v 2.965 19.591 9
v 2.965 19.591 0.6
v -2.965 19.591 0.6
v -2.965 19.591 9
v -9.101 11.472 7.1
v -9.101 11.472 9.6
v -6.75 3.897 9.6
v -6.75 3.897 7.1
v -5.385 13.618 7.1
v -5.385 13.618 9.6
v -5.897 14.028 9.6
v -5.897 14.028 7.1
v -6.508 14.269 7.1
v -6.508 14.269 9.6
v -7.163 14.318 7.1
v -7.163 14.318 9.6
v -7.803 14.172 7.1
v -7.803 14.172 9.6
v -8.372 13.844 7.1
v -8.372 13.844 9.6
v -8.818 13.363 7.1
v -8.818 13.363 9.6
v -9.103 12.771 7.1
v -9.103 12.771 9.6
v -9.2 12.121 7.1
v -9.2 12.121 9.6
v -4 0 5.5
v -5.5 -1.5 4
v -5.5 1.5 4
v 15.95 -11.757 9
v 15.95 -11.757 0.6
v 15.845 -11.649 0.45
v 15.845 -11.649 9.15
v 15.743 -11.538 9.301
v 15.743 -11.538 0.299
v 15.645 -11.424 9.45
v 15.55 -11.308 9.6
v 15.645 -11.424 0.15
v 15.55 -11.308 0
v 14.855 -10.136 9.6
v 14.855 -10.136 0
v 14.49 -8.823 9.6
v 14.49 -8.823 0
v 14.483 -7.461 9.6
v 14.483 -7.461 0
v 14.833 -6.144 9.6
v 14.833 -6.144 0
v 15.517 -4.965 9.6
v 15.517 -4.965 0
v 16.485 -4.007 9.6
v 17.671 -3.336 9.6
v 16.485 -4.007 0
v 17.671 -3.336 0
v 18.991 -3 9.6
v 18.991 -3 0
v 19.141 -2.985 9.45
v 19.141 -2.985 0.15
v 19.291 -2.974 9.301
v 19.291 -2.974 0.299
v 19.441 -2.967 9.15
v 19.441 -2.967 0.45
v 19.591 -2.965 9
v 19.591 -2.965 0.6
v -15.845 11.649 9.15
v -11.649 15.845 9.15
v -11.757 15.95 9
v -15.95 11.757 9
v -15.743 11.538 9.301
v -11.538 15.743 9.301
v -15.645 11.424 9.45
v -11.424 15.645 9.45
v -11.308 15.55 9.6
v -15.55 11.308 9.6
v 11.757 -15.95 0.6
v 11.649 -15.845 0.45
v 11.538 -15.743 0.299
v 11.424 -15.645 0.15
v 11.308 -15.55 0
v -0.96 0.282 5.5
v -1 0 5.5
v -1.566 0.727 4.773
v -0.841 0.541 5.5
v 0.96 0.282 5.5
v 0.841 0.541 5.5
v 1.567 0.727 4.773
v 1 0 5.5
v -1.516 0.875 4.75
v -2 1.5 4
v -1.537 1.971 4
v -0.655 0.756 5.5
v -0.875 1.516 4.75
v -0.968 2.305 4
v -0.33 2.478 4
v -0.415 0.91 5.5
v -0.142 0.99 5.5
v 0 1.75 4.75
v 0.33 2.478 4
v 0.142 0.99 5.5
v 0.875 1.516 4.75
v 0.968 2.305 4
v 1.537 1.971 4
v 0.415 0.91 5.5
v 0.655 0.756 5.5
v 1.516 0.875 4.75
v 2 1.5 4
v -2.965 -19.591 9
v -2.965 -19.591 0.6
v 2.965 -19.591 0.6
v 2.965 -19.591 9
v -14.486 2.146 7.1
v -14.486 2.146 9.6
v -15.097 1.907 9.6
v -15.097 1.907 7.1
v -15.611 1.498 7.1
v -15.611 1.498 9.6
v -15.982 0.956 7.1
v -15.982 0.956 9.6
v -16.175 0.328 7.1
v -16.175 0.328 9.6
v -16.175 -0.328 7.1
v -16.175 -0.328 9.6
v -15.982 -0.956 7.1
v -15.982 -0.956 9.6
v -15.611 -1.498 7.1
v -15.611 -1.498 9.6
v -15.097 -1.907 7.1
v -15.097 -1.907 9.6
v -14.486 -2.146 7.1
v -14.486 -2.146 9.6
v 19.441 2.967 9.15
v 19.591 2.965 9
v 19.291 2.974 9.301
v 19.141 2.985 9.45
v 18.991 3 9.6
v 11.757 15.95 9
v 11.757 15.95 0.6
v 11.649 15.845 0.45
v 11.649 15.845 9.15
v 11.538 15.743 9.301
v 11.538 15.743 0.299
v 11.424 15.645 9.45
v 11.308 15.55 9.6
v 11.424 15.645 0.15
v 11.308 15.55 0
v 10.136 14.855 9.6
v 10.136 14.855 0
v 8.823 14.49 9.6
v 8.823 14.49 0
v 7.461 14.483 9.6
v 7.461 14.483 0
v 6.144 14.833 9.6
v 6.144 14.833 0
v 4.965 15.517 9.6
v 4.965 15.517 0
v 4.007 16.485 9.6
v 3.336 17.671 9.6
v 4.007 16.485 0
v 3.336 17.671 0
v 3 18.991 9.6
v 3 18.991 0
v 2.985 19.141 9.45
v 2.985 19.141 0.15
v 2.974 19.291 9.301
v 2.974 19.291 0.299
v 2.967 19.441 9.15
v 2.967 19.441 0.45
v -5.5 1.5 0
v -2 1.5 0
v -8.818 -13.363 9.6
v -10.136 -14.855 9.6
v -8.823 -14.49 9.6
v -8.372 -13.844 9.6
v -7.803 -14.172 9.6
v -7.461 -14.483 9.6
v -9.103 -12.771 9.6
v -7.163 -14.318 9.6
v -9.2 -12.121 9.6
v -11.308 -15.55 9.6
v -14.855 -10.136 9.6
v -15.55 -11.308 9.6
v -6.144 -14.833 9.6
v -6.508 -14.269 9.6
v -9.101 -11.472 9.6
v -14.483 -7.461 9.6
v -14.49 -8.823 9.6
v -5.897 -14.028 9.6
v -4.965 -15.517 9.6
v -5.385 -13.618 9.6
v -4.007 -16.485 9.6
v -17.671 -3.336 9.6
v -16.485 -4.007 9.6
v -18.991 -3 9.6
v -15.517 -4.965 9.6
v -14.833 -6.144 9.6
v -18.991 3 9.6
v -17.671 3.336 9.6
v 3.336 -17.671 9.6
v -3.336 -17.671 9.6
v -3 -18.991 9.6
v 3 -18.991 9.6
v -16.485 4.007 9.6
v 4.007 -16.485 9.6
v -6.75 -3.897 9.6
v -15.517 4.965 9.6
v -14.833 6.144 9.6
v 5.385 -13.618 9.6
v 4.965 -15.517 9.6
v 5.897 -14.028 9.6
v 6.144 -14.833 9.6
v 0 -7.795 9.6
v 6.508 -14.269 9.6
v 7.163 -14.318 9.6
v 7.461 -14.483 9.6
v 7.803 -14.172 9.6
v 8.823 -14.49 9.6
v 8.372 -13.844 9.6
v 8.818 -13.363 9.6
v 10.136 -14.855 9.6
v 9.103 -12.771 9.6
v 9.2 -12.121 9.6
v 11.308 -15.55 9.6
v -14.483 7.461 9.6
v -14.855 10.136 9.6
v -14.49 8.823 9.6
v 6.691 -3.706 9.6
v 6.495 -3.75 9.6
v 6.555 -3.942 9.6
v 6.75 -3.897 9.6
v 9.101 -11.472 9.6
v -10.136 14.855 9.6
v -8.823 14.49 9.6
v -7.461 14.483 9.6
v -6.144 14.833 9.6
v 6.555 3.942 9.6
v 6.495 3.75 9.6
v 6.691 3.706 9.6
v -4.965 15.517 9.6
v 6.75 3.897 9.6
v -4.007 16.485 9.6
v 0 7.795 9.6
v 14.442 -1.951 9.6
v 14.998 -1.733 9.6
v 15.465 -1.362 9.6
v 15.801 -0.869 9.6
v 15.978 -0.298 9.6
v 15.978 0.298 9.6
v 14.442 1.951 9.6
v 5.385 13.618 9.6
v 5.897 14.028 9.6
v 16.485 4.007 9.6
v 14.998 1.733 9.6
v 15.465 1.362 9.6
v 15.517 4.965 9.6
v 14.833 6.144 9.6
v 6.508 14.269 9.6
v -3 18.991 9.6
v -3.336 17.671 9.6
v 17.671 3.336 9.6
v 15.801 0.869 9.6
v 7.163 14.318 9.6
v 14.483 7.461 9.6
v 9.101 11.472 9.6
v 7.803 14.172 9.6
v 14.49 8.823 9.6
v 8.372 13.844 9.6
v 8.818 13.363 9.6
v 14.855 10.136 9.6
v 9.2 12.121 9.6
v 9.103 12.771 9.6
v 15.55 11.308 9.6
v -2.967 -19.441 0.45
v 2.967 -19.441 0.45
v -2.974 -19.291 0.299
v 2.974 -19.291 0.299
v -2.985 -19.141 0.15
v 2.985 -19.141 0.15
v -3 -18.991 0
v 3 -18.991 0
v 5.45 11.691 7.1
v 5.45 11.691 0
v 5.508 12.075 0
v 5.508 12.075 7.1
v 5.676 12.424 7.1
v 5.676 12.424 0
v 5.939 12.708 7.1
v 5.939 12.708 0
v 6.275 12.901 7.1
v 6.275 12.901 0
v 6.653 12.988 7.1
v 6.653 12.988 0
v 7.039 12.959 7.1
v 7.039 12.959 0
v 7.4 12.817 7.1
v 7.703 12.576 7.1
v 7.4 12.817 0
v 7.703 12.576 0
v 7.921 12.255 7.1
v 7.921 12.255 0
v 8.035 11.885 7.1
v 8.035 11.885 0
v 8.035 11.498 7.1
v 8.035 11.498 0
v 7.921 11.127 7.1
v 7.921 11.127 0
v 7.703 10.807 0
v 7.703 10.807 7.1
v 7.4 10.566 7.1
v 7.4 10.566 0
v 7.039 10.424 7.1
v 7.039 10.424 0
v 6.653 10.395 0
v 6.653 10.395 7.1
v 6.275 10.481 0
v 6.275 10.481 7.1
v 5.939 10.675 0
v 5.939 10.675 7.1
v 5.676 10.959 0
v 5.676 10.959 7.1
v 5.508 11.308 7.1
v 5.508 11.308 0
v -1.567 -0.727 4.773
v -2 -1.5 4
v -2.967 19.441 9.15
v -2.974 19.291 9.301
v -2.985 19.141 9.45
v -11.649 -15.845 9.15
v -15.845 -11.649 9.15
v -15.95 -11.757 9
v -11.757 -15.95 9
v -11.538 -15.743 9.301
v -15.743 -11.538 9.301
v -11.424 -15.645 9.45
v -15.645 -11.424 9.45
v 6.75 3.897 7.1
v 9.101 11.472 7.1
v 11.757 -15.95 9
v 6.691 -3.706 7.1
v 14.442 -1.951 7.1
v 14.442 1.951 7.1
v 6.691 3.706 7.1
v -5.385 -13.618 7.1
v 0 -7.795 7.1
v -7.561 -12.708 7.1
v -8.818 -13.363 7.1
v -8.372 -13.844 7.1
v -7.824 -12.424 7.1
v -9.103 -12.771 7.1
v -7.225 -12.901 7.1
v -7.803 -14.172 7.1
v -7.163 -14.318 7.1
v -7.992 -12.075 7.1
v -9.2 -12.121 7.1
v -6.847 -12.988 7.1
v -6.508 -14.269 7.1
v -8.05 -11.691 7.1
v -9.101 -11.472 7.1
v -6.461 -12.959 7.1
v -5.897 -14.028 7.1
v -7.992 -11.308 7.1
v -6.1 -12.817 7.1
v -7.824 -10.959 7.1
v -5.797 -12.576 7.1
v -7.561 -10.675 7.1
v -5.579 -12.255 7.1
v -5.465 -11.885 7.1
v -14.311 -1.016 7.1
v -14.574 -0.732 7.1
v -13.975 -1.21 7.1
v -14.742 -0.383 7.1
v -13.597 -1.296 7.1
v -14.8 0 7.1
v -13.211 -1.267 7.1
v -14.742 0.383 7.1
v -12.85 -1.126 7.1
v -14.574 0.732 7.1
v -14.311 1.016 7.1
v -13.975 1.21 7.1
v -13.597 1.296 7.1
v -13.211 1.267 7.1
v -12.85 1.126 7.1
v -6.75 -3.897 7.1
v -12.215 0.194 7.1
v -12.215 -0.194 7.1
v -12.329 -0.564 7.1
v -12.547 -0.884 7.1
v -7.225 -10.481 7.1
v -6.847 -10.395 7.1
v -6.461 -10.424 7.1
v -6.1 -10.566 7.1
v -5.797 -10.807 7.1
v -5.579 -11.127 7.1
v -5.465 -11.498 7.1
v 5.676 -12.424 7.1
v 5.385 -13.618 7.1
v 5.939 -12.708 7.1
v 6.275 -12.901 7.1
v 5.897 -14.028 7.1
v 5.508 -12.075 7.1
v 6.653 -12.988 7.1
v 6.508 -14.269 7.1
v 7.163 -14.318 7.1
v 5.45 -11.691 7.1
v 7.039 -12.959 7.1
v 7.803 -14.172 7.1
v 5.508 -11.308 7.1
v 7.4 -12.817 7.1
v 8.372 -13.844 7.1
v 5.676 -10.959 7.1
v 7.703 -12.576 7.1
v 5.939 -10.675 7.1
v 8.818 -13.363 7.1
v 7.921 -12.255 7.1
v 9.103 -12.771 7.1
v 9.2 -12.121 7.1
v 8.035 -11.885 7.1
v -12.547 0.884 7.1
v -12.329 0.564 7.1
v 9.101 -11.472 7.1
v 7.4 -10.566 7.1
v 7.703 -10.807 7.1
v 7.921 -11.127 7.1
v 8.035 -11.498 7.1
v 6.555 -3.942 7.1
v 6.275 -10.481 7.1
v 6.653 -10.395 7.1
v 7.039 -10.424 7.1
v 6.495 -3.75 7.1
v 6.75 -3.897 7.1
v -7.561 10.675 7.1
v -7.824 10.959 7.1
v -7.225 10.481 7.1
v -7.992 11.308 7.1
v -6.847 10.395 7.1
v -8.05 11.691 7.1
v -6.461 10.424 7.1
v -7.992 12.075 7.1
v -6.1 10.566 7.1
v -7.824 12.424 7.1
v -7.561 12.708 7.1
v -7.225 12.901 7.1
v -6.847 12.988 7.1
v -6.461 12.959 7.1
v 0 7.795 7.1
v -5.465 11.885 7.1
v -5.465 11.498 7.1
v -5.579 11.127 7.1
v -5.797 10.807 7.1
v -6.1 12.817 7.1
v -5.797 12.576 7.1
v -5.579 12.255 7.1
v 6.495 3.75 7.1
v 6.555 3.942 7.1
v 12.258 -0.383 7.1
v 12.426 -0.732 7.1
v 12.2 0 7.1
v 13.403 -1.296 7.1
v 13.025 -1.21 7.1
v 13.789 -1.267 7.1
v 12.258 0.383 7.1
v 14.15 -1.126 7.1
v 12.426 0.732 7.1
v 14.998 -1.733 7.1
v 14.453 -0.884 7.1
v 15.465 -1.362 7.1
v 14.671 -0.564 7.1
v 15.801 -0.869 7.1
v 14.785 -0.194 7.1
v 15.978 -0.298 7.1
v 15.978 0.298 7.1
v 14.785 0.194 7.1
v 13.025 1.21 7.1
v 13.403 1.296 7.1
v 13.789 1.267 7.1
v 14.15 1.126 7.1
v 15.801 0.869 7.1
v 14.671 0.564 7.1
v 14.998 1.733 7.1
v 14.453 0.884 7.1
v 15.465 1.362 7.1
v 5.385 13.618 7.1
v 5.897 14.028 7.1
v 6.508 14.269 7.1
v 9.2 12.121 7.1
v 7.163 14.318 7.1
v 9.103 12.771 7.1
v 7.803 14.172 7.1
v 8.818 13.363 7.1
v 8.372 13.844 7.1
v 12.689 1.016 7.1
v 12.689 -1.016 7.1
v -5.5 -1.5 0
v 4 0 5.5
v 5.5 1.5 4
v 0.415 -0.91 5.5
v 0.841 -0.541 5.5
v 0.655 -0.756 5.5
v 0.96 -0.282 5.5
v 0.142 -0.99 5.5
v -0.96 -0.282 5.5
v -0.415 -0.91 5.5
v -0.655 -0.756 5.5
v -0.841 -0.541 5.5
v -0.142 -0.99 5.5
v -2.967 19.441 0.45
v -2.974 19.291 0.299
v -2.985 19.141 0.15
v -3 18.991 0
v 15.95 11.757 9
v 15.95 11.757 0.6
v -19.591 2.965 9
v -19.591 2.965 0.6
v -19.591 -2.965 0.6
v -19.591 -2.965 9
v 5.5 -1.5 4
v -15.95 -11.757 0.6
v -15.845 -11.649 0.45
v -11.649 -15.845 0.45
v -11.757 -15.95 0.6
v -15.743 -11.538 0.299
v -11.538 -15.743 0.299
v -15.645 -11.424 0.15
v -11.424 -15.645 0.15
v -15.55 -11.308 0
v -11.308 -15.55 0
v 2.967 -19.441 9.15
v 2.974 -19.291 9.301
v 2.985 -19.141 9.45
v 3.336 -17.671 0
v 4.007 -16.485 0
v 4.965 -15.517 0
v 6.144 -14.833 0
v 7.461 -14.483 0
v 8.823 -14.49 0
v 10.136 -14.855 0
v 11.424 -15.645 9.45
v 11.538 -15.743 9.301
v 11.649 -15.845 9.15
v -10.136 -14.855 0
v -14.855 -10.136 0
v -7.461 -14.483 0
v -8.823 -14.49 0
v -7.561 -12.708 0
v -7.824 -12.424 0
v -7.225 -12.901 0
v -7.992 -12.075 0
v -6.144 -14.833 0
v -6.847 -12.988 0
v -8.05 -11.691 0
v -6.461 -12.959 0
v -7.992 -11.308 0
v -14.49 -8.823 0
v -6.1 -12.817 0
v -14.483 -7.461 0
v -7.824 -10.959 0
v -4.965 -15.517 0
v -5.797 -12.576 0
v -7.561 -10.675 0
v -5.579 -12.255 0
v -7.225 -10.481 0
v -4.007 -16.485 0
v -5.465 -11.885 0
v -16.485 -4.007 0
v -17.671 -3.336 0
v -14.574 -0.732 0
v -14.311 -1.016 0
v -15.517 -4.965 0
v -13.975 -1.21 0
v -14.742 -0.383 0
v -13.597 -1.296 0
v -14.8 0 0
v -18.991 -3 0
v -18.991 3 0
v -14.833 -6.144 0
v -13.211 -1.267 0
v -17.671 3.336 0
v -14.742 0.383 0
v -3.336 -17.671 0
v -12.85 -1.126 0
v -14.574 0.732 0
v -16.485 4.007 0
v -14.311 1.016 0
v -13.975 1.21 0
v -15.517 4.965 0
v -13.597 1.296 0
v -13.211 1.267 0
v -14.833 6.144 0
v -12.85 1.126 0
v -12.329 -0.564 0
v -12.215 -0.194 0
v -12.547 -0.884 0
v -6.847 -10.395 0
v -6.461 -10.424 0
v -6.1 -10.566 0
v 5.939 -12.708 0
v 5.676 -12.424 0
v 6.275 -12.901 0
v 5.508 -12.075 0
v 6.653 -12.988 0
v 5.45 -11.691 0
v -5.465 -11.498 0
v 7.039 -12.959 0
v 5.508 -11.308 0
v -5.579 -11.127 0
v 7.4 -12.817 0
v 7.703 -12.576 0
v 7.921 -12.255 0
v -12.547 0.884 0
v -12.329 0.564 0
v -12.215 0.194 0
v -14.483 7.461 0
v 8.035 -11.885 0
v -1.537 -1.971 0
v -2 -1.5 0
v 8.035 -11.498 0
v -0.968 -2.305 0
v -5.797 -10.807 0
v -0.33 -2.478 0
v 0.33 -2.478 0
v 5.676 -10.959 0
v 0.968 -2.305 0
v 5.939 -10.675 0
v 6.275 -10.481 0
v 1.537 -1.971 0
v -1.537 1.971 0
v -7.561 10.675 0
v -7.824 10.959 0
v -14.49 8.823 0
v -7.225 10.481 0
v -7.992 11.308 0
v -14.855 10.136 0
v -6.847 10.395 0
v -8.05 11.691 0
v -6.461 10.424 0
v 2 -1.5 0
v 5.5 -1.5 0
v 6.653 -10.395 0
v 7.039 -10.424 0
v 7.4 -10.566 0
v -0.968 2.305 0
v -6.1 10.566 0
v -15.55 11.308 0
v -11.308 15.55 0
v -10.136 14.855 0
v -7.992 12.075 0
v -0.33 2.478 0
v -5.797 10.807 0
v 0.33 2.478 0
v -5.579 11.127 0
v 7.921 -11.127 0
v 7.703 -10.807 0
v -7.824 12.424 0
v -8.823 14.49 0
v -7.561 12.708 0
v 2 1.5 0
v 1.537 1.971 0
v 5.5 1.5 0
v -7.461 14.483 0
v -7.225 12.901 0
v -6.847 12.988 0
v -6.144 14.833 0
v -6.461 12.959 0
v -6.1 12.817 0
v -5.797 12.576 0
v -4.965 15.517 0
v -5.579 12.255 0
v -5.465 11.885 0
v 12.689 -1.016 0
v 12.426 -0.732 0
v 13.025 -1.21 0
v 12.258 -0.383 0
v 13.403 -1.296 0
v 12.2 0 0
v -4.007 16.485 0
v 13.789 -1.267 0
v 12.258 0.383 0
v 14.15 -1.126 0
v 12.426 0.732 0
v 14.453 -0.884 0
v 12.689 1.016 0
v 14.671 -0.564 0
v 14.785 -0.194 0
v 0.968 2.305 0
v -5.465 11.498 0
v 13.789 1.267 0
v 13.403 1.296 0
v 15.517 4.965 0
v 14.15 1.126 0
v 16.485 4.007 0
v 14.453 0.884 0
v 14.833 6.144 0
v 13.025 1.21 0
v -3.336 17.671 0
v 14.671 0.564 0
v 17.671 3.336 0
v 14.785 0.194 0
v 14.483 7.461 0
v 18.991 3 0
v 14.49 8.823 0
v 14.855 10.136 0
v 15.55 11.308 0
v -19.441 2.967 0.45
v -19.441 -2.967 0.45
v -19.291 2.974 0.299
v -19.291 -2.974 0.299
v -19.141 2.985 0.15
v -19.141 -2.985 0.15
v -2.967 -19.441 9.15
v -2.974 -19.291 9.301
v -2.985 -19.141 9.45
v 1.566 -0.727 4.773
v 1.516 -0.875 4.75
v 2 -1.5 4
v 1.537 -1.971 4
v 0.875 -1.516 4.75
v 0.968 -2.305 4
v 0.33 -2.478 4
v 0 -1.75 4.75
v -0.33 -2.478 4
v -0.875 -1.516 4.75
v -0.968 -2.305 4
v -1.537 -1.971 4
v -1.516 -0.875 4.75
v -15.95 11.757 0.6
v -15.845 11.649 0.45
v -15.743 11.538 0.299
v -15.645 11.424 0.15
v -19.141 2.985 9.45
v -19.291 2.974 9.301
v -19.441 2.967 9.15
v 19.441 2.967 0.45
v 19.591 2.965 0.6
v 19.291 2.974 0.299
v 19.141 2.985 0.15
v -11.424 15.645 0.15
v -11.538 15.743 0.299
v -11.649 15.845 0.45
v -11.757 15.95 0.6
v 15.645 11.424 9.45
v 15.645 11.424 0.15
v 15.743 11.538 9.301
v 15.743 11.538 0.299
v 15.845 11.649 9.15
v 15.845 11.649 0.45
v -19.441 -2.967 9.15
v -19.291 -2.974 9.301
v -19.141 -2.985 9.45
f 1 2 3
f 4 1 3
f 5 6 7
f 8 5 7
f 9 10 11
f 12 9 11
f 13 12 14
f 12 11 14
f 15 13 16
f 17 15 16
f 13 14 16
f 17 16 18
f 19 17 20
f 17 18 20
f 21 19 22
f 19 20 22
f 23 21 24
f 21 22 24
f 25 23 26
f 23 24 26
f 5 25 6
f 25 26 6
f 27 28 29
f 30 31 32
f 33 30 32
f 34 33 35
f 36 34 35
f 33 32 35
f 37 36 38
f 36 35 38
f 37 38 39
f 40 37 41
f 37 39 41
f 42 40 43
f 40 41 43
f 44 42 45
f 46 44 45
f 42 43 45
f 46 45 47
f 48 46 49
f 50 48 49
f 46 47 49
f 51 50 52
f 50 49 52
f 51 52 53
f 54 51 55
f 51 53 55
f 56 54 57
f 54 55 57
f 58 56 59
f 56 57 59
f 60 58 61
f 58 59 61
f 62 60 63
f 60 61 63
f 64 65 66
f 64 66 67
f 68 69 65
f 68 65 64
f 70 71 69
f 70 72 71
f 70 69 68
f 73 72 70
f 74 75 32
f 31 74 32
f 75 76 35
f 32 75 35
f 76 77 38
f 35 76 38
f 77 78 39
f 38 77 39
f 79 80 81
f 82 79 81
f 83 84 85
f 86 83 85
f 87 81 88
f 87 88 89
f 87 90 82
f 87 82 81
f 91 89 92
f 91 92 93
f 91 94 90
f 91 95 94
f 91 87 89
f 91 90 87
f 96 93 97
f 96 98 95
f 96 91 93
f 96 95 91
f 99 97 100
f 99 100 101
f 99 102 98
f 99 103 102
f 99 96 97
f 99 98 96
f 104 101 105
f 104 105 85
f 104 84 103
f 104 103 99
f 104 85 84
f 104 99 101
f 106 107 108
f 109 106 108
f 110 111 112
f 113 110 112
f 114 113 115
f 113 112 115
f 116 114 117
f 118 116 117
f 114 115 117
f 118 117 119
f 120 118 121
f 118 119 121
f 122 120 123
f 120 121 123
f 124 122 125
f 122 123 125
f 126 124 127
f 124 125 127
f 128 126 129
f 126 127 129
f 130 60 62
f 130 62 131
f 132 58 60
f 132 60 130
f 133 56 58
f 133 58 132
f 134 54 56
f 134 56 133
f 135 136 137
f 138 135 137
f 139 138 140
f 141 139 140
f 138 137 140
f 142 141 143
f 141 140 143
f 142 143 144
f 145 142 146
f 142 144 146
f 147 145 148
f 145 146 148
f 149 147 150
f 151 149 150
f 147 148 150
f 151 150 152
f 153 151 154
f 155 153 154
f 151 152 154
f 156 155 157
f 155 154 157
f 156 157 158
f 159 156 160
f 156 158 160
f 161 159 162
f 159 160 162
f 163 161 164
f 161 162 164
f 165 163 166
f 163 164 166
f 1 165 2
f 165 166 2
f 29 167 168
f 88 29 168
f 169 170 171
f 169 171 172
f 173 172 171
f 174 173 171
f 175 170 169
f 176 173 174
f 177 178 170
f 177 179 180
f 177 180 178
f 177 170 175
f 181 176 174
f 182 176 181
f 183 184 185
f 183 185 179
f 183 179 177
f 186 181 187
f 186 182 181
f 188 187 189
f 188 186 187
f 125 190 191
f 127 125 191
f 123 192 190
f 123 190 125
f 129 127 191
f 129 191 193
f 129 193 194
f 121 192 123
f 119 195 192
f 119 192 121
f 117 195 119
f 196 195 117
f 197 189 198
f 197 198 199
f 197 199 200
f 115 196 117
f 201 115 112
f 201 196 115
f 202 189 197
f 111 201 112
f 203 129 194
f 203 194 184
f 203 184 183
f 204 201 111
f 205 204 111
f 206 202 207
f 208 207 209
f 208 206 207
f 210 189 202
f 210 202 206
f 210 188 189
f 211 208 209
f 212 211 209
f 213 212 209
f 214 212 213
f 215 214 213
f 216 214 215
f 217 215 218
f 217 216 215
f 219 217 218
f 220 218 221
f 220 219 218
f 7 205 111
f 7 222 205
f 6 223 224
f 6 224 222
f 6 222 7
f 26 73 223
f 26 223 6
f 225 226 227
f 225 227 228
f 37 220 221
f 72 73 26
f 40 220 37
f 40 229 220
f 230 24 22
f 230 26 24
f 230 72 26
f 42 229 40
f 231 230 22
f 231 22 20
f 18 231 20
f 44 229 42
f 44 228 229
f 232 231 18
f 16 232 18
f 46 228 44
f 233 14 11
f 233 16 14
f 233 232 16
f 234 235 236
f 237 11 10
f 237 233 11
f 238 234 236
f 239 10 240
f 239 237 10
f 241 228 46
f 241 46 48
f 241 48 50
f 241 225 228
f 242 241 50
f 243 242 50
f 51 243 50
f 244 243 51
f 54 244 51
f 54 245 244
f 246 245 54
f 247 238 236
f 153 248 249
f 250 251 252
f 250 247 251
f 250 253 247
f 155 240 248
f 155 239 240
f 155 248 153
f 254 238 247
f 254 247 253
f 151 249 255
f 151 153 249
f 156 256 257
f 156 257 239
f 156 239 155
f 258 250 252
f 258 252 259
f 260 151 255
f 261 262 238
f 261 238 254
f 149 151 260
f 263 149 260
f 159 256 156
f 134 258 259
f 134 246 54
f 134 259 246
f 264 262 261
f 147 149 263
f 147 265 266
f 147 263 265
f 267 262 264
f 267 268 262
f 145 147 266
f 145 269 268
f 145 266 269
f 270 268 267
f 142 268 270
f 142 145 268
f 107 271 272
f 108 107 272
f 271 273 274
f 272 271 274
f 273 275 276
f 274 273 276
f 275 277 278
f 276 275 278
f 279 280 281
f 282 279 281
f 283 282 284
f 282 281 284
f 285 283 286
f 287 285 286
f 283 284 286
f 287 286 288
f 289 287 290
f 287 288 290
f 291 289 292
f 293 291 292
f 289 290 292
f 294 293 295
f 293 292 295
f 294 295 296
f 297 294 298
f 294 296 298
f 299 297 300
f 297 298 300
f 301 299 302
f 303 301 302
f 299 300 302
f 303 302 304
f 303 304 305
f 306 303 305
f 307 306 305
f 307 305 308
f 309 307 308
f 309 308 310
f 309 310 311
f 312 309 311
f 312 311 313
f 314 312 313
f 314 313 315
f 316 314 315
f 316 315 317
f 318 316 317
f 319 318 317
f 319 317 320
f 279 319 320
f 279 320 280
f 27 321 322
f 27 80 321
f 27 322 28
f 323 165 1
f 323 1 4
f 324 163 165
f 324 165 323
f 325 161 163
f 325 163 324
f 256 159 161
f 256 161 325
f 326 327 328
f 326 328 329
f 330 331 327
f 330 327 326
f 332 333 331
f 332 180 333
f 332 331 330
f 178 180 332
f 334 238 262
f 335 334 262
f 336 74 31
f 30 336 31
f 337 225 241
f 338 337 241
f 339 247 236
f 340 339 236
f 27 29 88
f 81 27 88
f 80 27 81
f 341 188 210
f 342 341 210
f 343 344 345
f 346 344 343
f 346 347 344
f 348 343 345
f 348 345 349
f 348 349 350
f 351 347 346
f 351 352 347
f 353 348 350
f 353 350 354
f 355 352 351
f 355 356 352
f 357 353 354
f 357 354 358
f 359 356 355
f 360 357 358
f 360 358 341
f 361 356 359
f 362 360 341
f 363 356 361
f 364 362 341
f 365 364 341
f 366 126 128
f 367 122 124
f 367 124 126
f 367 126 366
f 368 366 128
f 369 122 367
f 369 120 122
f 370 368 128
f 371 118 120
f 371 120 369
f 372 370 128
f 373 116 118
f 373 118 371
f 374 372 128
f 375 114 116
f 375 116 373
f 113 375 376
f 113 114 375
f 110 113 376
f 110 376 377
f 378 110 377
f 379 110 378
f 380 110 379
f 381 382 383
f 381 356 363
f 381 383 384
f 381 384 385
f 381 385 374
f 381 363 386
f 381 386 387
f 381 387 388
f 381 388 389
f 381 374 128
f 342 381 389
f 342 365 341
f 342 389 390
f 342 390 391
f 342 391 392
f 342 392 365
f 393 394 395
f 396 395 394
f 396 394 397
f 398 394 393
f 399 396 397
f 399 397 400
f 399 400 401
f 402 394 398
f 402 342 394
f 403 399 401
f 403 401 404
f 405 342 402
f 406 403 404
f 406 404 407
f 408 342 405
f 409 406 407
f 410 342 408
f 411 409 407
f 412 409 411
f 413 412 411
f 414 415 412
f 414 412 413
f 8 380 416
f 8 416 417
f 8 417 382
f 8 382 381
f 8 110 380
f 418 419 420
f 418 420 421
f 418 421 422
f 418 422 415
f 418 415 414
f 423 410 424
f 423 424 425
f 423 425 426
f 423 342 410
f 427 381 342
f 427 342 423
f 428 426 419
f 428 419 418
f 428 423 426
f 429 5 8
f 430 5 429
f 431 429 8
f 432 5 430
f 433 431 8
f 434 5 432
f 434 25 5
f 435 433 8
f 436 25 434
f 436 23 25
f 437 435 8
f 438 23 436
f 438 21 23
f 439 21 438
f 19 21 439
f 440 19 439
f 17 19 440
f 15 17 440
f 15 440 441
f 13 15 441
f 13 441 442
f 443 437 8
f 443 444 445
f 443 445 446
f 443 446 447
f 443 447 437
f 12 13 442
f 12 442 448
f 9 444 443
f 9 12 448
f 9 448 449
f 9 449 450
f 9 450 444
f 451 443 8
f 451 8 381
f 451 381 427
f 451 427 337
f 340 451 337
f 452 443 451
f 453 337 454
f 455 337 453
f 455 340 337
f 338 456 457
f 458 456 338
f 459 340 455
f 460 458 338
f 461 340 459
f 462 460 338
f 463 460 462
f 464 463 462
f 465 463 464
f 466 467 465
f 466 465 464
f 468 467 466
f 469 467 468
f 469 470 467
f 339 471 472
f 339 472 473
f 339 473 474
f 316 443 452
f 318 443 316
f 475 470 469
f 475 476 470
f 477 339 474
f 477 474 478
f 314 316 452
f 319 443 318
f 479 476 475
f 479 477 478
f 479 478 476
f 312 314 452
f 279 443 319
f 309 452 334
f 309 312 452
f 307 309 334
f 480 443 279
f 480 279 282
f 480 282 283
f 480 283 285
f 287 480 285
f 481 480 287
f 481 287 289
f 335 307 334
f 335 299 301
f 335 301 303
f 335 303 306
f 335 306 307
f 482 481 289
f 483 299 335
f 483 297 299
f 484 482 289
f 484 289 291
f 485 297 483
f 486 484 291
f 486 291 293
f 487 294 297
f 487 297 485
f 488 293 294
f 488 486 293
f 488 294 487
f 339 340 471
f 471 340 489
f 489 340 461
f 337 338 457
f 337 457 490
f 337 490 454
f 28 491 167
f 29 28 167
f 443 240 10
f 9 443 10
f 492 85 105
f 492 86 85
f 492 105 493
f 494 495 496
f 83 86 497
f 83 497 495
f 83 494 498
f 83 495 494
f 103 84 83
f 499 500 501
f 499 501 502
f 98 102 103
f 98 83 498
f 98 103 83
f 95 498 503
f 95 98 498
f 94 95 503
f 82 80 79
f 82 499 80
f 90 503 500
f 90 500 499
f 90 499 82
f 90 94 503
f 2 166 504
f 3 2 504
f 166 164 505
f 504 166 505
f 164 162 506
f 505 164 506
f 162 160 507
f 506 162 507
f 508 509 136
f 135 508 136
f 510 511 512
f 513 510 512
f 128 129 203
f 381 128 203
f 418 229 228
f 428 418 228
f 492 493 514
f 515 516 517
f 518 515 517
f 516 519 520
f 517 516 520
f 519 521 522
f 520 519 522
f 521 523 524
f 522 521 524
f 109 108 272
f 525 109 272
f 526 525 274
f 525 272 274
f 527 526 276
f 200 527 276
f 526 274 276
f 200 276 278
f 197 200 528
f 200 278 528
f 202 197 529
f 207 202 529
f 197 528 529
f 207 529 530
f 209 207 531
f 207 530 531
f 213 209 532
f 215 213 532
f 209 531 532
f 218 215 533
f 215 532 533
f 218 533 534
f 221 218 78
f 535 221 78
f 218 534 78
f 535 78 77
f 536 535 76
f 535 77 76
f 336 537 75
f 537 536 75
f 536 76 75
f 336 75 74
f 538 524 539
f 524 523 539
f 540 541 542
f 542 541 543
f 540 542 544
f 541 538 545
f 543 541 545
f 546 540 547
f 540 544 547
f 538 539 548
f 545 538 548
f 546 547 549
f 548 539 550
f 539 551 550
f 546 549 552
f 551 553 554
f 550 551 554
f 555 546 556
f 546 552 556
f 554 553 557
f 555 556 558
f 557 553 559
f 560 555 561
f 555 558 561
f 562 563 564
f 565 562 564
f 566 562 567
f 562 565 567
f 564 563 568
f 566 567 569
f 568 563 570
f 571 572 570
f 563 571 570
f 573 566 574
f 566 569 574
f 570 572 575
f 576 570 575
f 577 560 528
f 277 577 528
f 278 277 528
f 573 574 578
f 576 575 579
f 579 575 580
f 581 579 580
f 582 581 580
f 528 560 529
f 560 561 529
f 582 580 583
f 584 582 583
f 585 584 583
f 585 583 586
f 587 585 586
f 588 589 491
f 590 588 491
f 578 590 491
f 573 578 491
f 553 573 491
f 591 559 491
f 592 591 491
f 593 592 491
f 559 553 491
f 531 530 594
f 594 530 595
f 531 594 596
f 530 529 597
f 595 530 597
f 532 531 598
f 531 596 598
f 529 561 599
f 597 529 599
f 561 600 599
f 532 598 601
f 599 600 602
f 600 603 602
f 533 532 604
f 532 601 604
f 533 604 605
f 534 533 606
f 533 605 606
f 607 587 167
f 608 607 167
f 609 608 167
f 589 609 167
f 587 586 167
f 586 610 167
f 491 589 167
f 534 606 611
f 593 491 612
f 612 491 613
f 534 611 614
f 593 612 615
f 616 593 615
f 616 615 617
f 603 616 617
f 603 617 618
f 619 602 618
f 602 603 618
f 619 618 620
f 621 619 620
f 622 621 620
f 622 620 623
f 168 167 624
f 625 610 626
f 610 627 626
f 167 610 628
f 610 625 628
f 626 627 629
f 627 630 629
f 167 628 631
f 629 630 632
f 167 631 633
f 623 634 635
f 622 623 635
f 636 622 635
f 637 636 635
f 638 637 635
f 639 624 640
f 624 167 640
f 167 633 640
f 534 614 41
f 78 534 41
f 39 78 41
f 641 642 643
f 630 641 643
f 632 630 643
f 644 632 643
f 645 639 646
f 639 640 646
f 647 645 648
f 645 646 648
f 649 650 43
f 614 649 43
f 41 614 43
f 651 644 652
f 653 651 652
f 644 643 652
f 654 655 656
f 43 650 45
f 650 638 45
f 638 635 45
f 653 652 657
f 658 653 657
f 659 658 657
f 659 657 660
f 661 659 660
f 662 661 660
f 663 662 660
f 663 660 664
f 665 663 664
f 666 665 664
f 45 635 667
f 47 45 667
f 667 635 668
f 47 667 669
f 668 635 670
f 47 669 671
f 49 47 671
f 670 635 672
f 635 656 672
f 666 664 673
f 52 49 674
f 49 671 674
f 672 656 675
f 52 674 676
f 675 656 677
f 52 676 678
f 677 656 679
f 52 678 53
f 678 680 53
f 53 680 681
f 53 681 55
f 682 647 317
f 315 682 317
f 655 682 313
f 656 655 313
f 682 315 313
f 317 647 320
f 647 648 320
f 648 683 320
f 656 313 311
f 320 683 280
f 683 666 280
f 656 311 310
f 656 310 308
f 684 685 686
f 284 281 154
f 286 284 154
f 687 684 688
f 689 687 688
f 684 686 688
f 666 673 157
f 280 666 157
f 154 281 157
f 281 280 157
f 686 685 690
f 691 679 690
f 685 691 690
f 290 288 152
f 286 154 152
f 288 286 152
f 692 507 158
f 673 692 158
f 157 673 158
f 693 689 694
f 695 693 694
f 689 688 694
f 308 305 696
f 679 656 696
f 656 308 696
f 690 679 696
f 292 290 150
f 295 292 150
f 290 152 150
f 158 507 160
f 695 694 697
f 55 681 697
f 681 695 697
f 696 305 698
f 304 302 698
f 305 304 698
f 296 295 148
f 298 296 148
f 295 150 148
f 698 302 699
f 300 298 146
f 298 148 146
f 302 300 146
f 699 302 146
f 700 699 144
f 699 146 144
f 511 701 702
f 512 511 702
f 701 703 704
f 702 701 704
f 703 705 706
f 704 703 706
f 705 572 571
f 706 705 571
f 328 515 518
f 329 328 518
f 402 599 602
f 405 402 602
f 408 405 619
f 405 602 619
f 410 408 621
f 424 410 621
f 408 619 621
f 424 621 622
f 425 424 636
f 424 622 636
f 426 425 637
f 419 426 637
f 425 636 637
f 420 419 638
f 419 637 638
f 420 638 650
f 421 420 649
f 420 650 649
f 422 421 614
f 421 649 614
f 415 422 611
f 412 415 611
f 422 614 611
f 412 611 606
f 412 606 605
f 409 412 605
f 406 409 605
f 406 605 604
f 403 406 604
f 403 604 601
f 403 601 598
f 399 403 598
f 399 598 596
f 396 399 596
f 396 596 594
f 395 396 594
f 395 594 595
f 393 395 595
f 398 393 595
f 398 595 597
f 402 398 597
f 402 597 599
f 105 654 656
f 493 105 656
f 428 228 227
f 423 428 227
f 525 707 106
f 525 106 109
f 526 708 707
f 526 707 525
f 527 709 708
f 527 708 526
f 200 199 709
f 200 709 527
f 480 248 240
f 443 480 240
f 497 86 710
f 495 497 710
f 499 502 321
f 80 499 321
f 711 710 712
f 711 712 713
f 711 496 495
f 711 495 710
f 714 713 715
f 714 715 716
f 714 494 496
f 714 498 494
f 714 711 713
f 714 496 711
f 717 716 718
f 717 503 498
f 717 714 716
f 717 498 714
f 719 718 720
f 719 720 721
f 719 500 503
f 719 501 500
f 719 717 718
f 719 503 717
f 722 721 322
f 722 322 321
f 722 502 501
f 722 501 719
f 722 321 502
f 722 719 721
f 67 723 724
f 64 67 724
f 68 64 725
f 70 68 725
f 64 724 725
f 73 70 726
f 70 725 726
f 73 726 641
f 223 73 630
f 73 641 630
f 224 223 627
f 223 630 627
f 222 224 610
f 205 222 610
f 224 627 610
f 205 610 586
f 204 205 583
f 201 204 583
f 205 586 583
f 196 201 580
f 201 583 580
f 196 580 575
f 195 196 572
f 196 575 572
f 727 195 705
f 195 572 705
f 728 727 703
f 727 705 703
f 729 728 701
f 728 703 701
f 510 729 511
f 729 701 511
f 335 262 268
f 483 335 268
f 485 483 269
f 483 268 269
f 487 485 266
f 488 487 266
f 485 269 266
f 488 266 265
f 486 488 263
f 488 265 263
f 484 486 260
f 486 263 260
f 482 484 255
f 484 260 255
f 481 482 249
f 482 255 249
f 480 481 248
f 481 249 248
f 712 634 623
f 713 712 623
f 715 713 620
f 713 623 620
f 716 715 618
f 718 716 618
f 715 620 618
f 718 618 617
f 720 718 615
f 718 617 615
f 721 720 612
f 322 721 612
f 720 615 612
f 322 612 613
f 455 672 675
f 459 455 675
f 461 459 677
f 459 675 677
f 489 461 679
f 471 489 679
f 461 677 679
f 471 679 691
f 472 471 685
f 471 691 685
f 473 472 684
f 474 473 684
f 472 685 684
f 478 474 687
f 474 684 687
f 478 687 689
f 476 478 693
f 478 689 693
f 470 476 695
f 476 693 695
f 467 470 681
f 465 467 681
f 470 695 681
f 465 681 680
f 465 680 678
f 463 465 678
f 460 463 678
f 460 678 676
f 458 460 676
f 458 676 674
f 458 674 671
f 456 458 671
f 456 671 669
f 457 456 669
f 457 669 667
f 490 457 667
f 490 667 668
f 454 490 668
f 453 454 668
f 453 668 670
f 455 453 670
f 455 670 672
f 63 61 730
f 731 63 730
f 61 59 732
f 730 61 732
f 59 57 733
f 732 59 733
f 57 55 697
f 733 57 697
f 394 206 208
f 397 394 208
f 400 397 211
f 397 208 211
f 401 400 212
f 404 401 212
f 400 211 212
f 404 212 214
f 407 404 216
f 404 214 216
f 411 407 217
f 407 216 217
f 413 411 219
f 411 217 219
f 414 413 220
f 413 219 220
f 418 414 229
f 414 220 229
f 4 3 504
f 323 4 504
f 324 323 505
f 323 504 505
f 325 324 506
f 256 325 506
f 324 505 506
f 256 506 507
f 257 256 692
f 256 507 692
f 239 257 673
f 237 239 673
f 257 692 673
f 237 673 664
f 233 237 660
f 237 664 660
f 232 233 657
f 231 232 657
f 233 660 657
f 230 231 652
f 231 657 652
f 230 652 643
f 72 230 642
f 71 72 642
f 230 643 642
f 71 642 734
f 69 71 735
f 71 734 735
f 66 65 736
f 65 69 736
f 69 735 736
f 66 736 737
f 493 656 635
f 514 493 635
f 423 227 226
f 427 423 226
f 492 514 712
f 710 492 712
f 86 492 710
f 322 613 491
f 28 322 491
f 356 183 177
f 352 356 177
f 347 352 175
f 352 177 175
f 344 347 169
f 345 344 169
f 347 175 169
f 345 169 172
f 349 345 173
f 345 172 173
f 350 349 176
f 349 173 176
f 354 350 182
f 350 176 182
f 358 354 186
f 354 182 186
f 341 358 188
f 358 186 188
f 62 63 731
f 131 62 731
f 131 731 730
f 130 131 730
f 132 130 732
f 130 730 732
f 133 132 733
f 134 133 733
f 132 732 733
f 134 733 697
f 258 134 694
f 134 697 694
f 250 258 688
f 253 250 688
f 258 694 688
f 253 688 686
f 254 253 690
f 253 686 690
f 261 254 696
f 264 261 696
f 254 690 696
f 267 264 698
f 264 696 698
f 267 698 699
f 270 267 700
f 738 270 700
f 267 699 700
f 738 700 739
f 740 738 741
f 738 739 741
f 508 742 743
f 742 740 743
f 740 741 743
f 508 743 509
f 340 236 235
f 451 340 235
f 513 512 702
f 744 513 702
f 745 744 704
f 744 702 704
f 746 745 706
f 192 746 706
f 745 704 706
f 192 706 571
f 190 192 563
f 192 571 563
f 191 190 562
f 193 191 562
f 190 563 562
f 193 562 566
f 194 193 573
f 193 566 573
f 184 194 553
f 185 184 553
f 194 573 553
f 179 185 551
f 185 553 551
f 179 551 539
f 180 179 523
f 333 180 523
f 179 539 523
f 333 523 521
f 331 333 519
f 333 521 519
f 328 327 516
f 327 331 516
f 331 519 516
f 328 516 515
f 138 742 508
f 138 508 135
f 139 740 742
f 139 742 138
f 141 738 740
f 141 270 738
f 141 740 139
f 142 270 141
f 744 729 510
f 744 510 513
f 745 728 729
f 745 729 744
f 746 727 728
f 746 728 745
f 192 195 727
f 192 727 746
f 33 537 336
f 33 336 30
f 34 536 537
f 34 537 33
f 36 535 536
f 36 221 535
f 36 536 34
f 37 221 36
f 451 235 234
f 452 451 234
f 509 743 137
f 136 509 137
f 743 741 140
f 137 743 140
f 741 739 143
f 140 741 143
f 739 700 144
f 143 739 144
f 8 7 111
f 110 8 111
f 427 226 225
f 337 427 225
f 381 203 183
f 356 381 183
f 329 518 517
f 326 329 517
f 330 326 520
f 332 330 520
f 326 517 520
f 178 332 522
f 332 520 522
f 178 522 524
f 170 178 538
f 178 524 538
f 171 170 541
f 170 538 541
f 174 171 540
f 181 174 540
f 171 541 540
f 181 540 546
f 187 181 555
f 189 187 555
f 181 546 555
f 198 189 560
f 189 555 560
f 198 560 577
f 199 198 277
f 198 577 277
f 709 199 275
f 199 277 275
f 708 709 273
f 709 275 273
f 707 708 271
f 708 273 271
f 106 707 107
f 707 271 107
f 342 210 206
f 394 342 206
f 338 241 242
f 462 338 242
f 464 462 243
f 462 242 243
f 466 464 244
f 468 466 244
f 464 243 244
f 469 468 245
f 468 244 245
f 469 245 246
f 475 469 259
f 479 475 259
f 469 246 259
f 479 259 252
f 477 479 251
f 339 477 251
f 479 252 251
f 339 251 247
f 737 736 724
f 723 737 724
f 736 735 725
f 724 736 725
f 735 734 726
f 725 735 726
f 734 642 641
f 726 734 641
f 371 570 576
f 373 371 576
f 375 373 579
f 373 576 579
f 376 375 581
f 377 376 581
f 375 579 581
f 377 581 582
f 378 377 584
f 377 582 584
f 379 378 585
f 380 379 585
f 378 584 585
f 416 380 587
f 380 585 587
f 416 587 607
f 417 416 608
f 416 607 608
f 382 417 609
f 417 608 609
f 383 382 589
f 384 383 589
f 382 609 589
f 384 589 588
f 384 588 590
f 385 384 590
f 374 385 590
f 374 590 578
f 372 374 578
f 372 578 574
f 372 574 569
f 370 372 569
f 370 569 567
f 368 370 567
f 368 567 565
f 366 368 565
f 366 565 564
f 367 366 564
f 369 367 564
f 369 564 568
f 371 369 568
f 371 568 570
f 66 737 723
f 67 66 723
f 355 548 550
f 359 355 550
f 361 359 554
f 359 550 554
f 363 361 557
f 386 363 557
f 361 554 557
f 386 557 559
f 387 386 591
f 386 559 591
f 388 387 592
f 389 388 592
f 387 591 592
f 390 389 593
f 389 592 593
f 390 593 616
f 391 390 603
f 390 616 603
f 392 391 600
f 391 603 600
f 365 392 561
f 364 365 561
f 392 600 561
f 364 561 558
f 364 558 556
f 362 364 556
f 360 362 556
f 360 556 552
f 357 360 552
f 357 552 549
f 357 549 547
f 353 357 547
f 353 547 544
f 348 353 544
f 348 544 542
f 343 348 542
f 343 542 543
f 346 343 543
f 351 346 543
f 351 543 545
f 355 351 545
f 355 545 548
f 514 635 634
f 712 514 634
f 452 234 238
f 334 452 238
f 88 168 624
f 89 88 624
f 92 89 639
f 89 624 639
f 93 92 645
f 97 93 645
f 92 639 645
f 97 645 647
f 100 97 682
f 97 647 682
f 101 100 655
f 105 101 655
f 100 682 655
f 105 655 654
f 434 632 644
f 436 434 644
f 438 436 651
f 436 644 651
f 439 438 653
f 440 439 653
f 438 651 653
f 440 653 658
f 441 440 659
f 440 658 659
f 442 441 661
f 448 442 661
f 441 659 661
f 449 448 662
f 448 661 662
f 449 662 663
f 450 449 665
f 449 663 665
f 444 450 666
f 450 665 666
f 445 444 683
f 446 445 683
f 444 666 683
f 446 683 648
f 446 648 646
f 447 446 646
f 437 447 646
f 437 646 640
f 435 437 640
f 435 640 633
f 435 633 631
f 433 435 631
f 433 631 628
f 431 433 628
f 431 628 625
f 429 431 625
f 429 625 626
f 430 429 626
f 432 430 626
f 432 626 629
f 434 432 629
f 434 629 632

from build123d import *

# Parameters (mm, degrees)
BOSS_EXTRUDE1_DEPTH  = 9.6
CHAMFER2_SIZE        = 0.6
CUT_EXTRUDE2_DEPTH   = 2.5
M2_CLEARANCE_HOLE1_D = 2.6
CUT_EXTRUDE3_START   = -9.6
CUT_EXTRUDE3_DEPTH   = 5.5
CHAMFER3_SIZE        = 1.5


with BuildPart() as part:
    # Sketch1 → Boss-Extrude1 (new body)
    with BuildSketch(Plane.XY):
        with BuildLine():
            ThreePointArc((-11.756599923, -15.949743136), (-6.144180323, -14.833363466), (-2.965, -19.591343059))
            Line((-2.965, -19.591343059), (2.965, -19.591343059))
            ThreePointArc((2.965, -19.591343059), (6.144180323, -14.833363466), (11.756599923, -15.949743136))
            Line((11.756599923, -15.949743136), (15.949743136, -11.756599923))
            ThreePointArc((15.949743136, -11.756599923), (14.833363466, -6.144180323), (19.591343059, -2.965))
            Line((19.591343059, -2.965), (19.591343059, 2.965))
            ThreePointArc((19.591343059, 2.965), (14.833363466, 6.144180323), (15.949743136, 11.756599923))
            Line((15.949743136, 11.756599923), (11.756599923, 15.949743136))
            ThreePointArc((11.756599923, 15.949743136), (6.144180323, 14.833363466), (2.965, 19.591343059))
            Line((2.965, 19.591343059), (-2.965, 19.591343059))
            ThreePointArc((-2.965, 19.591343059), (-6.144180323, 14.833363466), (-11.756599923, 15.949743136))
            Line((-11.756599923, 15.949743136), (-15.949743136, 11.756599923))
            ThreePointArc((-15.949743136, 11.756599923), (-14.833363466, 6.144180323), (-19.591343059, 2.965))
            Line((-19.591343059, 2.965), (-19.591343059, -2.965))
            ThreePointArc((-19.591343059, -2.965), (-14.833363466, -6.144180323), (-15.949743136, -11.756599923))
            Line((-15.949743136, -11.756599923), (-11.756599923, -15.949743136))
        make_face()
    extrude(amount=BOSS_EXTRUDE1_DEPTH)

    # Chamfer2
    chamfer2_edges = [part.edges().sort_by_distance(p)[0] for p in [
        (-19.591343059, 0, 9.6),
        (-13.853171529, 13.853171529, 0),
        (0, 19.591343059, 0),
        (13.853171529, 13.853171529, 0),
        (19.591343059, 0, 0),
        (-13.853171529, -13.853171529, 9.6),
        (13.853171529, -13.853171529, 0),
        (0, -19.591343059, 0),
        (-13.853171529, -13.853171529, 0),
        (-19.591343059, 0, 0),
        (0, -19.591343059, 9.6),
        (13.853171529, -13.853171529, 9.6),
        (19.591343059, 0, 9.6),
        (13.853171529, 13.853171529, 9.6),
        (0, 19.591343059, 9.6),
        (-13.853171529, 13.853171529, 9.6),
    ]]
    chamfer(chamfer2_edges, length=CHAMFER2_SIZE)

    # Sketch4 → Cut-Extrude2 (cut)
    with BuildSketch(Plane.XY.offset(9.6)):
        with BuildLine():
            ThreePointArc((14.441692106, -1.95061736), (16, 0), (14.441692106, 1.95061736))
            Line((14.441692106, 1.95061736), (6.69085075, 3.70569527))
            Line((6.69085075, 3.70569527), (6.495190528, 3.75))
            Line((6.495190528, 3.75), (6.554651618, 3.941599088))
            Line((6.554651618, 3.941599088), (6.750311839, 3.897294358))
            Line((6.750311839, 3.897294358), (9.101143263, 11.472284348))
            ThreePointArc((9.101143263, 11.472284348), (8.1, 14.029611541), (5.384718053, 13.617963443))
            Line((5.384718053, 13.617963443), (0, 7.794588715))
            Line((0, 7.794588715), (-5.384718053, 13.617963443))
            ThreePointArc((-5.384718053, 13.617963443), (-8.1, 14.029611541), (-9.101143263, 11.472284348))
            Line((-9.101143263, 11.472284348), (-6.750311839, 3.897294358))
            Line((-6.750311839, 3.897294358), (-14.485861316, 2.145679096))
            ThreePointArc((-14.485861316, 2.145679096), (-16.2, 0), (-14.485861316, -2.145679096))
            Line((-14.485861316, -2.145679096), (-6.750311839, -3.897294358))
            Line((-6.750311839, -3.897294358), (-9.101143263, -11.472284348))
            ThreePointArc((-9.101143263, -11.472284348), (-8.1, -14.029611541), (-5.384718053, -13.617963443))
            Line((-5.384718053, -13.617963443), (0, -7.794588715))
            Line((0, -7.794588715), (5.384718053, -13.617963443))
            ThreePointArc((5.384718053, -13.617963443), (8.1, -14.029611541), (9.101143263, -11.472284348))
            Line((9.101143263, -11.472284348), (6.750311839, -3.897294358))
            Line((6.750311839, -3.897294358), (6.554651618, -3.941599088))
            Line((6.554651618, -3.941599088), (6.495190528, -3.75))
            Line((6.495190528, -3.75), (6.69085075, -3.70569527))
            Line((6.69085075, -3.70569527), (14.441692106, -1.95061736))
        make_face()
    extrude(amount=-CUT_EXTRUDE2_DEPTH, mode=Mode.SUBTRACT)

    # M2 Clearance Hole1 (through all)
    with Locations(Plane.XY.offset(7.1)):
        with Locations((13.5, 0), (6.75, -11.691342951), (-6.75, -11.691342951), (-13.5, 0), (-6.75, 11.691342951), (6.75, 11.691342951)):
            Hole(M2_CLEARANCE_HOLE1_D / 2)

    # Sketch3<2> → Cut-Extrude3 (cut)
    with BuildSketch(Plane.XY.offset(9.6).offset(CUT_EXTRUDE3_START)):
        with BuildLine():
            Line((-2, -1.5), (-5.5, -1.5))
            Line((-5.5, -1.5), (-5.5, 1.5))
            Line((-5.5, 1.5), (-2, 1.5))
            ThreePointArc((-2, 1.5), (0, 2.5), (2, 1.5))
            Line((2, 1.5), (5.5, 1.5))
            Line((5.5, 1.5), (5.5, -1.5))
            Line((5.5, -1.5), (2, -1.5))
            ThreePointArc((2, -1.5), (0, -2.5), (-2, -1.5))
        make_face()
    extrude(amount=CUT_EXTRUDE3_DEPTH, mode=Mode.SUBTRACT)

    # Chamfer3
    chamfer3_edges = [part.edges().sort_by_distance(p)[0] for p in [
        (-3.75, -1.5, 5.5),
        (0, -2.5, 5.5),
        (3.75, -1.5, 5.5),
        (5.5, 0, 5.5),
        (3.75, 1.5, 5.5),
        (0, 2.5, 5.5),
        (-3.75, 1.5, 5.5),
        (-5.5, 0, 5.5),
    ]]
    chamfer(chamfer3_edges, length=CHAMFER3_SIZE - 0.0001)  # a hair under: the kernel refuses the full size


solid = part.part
